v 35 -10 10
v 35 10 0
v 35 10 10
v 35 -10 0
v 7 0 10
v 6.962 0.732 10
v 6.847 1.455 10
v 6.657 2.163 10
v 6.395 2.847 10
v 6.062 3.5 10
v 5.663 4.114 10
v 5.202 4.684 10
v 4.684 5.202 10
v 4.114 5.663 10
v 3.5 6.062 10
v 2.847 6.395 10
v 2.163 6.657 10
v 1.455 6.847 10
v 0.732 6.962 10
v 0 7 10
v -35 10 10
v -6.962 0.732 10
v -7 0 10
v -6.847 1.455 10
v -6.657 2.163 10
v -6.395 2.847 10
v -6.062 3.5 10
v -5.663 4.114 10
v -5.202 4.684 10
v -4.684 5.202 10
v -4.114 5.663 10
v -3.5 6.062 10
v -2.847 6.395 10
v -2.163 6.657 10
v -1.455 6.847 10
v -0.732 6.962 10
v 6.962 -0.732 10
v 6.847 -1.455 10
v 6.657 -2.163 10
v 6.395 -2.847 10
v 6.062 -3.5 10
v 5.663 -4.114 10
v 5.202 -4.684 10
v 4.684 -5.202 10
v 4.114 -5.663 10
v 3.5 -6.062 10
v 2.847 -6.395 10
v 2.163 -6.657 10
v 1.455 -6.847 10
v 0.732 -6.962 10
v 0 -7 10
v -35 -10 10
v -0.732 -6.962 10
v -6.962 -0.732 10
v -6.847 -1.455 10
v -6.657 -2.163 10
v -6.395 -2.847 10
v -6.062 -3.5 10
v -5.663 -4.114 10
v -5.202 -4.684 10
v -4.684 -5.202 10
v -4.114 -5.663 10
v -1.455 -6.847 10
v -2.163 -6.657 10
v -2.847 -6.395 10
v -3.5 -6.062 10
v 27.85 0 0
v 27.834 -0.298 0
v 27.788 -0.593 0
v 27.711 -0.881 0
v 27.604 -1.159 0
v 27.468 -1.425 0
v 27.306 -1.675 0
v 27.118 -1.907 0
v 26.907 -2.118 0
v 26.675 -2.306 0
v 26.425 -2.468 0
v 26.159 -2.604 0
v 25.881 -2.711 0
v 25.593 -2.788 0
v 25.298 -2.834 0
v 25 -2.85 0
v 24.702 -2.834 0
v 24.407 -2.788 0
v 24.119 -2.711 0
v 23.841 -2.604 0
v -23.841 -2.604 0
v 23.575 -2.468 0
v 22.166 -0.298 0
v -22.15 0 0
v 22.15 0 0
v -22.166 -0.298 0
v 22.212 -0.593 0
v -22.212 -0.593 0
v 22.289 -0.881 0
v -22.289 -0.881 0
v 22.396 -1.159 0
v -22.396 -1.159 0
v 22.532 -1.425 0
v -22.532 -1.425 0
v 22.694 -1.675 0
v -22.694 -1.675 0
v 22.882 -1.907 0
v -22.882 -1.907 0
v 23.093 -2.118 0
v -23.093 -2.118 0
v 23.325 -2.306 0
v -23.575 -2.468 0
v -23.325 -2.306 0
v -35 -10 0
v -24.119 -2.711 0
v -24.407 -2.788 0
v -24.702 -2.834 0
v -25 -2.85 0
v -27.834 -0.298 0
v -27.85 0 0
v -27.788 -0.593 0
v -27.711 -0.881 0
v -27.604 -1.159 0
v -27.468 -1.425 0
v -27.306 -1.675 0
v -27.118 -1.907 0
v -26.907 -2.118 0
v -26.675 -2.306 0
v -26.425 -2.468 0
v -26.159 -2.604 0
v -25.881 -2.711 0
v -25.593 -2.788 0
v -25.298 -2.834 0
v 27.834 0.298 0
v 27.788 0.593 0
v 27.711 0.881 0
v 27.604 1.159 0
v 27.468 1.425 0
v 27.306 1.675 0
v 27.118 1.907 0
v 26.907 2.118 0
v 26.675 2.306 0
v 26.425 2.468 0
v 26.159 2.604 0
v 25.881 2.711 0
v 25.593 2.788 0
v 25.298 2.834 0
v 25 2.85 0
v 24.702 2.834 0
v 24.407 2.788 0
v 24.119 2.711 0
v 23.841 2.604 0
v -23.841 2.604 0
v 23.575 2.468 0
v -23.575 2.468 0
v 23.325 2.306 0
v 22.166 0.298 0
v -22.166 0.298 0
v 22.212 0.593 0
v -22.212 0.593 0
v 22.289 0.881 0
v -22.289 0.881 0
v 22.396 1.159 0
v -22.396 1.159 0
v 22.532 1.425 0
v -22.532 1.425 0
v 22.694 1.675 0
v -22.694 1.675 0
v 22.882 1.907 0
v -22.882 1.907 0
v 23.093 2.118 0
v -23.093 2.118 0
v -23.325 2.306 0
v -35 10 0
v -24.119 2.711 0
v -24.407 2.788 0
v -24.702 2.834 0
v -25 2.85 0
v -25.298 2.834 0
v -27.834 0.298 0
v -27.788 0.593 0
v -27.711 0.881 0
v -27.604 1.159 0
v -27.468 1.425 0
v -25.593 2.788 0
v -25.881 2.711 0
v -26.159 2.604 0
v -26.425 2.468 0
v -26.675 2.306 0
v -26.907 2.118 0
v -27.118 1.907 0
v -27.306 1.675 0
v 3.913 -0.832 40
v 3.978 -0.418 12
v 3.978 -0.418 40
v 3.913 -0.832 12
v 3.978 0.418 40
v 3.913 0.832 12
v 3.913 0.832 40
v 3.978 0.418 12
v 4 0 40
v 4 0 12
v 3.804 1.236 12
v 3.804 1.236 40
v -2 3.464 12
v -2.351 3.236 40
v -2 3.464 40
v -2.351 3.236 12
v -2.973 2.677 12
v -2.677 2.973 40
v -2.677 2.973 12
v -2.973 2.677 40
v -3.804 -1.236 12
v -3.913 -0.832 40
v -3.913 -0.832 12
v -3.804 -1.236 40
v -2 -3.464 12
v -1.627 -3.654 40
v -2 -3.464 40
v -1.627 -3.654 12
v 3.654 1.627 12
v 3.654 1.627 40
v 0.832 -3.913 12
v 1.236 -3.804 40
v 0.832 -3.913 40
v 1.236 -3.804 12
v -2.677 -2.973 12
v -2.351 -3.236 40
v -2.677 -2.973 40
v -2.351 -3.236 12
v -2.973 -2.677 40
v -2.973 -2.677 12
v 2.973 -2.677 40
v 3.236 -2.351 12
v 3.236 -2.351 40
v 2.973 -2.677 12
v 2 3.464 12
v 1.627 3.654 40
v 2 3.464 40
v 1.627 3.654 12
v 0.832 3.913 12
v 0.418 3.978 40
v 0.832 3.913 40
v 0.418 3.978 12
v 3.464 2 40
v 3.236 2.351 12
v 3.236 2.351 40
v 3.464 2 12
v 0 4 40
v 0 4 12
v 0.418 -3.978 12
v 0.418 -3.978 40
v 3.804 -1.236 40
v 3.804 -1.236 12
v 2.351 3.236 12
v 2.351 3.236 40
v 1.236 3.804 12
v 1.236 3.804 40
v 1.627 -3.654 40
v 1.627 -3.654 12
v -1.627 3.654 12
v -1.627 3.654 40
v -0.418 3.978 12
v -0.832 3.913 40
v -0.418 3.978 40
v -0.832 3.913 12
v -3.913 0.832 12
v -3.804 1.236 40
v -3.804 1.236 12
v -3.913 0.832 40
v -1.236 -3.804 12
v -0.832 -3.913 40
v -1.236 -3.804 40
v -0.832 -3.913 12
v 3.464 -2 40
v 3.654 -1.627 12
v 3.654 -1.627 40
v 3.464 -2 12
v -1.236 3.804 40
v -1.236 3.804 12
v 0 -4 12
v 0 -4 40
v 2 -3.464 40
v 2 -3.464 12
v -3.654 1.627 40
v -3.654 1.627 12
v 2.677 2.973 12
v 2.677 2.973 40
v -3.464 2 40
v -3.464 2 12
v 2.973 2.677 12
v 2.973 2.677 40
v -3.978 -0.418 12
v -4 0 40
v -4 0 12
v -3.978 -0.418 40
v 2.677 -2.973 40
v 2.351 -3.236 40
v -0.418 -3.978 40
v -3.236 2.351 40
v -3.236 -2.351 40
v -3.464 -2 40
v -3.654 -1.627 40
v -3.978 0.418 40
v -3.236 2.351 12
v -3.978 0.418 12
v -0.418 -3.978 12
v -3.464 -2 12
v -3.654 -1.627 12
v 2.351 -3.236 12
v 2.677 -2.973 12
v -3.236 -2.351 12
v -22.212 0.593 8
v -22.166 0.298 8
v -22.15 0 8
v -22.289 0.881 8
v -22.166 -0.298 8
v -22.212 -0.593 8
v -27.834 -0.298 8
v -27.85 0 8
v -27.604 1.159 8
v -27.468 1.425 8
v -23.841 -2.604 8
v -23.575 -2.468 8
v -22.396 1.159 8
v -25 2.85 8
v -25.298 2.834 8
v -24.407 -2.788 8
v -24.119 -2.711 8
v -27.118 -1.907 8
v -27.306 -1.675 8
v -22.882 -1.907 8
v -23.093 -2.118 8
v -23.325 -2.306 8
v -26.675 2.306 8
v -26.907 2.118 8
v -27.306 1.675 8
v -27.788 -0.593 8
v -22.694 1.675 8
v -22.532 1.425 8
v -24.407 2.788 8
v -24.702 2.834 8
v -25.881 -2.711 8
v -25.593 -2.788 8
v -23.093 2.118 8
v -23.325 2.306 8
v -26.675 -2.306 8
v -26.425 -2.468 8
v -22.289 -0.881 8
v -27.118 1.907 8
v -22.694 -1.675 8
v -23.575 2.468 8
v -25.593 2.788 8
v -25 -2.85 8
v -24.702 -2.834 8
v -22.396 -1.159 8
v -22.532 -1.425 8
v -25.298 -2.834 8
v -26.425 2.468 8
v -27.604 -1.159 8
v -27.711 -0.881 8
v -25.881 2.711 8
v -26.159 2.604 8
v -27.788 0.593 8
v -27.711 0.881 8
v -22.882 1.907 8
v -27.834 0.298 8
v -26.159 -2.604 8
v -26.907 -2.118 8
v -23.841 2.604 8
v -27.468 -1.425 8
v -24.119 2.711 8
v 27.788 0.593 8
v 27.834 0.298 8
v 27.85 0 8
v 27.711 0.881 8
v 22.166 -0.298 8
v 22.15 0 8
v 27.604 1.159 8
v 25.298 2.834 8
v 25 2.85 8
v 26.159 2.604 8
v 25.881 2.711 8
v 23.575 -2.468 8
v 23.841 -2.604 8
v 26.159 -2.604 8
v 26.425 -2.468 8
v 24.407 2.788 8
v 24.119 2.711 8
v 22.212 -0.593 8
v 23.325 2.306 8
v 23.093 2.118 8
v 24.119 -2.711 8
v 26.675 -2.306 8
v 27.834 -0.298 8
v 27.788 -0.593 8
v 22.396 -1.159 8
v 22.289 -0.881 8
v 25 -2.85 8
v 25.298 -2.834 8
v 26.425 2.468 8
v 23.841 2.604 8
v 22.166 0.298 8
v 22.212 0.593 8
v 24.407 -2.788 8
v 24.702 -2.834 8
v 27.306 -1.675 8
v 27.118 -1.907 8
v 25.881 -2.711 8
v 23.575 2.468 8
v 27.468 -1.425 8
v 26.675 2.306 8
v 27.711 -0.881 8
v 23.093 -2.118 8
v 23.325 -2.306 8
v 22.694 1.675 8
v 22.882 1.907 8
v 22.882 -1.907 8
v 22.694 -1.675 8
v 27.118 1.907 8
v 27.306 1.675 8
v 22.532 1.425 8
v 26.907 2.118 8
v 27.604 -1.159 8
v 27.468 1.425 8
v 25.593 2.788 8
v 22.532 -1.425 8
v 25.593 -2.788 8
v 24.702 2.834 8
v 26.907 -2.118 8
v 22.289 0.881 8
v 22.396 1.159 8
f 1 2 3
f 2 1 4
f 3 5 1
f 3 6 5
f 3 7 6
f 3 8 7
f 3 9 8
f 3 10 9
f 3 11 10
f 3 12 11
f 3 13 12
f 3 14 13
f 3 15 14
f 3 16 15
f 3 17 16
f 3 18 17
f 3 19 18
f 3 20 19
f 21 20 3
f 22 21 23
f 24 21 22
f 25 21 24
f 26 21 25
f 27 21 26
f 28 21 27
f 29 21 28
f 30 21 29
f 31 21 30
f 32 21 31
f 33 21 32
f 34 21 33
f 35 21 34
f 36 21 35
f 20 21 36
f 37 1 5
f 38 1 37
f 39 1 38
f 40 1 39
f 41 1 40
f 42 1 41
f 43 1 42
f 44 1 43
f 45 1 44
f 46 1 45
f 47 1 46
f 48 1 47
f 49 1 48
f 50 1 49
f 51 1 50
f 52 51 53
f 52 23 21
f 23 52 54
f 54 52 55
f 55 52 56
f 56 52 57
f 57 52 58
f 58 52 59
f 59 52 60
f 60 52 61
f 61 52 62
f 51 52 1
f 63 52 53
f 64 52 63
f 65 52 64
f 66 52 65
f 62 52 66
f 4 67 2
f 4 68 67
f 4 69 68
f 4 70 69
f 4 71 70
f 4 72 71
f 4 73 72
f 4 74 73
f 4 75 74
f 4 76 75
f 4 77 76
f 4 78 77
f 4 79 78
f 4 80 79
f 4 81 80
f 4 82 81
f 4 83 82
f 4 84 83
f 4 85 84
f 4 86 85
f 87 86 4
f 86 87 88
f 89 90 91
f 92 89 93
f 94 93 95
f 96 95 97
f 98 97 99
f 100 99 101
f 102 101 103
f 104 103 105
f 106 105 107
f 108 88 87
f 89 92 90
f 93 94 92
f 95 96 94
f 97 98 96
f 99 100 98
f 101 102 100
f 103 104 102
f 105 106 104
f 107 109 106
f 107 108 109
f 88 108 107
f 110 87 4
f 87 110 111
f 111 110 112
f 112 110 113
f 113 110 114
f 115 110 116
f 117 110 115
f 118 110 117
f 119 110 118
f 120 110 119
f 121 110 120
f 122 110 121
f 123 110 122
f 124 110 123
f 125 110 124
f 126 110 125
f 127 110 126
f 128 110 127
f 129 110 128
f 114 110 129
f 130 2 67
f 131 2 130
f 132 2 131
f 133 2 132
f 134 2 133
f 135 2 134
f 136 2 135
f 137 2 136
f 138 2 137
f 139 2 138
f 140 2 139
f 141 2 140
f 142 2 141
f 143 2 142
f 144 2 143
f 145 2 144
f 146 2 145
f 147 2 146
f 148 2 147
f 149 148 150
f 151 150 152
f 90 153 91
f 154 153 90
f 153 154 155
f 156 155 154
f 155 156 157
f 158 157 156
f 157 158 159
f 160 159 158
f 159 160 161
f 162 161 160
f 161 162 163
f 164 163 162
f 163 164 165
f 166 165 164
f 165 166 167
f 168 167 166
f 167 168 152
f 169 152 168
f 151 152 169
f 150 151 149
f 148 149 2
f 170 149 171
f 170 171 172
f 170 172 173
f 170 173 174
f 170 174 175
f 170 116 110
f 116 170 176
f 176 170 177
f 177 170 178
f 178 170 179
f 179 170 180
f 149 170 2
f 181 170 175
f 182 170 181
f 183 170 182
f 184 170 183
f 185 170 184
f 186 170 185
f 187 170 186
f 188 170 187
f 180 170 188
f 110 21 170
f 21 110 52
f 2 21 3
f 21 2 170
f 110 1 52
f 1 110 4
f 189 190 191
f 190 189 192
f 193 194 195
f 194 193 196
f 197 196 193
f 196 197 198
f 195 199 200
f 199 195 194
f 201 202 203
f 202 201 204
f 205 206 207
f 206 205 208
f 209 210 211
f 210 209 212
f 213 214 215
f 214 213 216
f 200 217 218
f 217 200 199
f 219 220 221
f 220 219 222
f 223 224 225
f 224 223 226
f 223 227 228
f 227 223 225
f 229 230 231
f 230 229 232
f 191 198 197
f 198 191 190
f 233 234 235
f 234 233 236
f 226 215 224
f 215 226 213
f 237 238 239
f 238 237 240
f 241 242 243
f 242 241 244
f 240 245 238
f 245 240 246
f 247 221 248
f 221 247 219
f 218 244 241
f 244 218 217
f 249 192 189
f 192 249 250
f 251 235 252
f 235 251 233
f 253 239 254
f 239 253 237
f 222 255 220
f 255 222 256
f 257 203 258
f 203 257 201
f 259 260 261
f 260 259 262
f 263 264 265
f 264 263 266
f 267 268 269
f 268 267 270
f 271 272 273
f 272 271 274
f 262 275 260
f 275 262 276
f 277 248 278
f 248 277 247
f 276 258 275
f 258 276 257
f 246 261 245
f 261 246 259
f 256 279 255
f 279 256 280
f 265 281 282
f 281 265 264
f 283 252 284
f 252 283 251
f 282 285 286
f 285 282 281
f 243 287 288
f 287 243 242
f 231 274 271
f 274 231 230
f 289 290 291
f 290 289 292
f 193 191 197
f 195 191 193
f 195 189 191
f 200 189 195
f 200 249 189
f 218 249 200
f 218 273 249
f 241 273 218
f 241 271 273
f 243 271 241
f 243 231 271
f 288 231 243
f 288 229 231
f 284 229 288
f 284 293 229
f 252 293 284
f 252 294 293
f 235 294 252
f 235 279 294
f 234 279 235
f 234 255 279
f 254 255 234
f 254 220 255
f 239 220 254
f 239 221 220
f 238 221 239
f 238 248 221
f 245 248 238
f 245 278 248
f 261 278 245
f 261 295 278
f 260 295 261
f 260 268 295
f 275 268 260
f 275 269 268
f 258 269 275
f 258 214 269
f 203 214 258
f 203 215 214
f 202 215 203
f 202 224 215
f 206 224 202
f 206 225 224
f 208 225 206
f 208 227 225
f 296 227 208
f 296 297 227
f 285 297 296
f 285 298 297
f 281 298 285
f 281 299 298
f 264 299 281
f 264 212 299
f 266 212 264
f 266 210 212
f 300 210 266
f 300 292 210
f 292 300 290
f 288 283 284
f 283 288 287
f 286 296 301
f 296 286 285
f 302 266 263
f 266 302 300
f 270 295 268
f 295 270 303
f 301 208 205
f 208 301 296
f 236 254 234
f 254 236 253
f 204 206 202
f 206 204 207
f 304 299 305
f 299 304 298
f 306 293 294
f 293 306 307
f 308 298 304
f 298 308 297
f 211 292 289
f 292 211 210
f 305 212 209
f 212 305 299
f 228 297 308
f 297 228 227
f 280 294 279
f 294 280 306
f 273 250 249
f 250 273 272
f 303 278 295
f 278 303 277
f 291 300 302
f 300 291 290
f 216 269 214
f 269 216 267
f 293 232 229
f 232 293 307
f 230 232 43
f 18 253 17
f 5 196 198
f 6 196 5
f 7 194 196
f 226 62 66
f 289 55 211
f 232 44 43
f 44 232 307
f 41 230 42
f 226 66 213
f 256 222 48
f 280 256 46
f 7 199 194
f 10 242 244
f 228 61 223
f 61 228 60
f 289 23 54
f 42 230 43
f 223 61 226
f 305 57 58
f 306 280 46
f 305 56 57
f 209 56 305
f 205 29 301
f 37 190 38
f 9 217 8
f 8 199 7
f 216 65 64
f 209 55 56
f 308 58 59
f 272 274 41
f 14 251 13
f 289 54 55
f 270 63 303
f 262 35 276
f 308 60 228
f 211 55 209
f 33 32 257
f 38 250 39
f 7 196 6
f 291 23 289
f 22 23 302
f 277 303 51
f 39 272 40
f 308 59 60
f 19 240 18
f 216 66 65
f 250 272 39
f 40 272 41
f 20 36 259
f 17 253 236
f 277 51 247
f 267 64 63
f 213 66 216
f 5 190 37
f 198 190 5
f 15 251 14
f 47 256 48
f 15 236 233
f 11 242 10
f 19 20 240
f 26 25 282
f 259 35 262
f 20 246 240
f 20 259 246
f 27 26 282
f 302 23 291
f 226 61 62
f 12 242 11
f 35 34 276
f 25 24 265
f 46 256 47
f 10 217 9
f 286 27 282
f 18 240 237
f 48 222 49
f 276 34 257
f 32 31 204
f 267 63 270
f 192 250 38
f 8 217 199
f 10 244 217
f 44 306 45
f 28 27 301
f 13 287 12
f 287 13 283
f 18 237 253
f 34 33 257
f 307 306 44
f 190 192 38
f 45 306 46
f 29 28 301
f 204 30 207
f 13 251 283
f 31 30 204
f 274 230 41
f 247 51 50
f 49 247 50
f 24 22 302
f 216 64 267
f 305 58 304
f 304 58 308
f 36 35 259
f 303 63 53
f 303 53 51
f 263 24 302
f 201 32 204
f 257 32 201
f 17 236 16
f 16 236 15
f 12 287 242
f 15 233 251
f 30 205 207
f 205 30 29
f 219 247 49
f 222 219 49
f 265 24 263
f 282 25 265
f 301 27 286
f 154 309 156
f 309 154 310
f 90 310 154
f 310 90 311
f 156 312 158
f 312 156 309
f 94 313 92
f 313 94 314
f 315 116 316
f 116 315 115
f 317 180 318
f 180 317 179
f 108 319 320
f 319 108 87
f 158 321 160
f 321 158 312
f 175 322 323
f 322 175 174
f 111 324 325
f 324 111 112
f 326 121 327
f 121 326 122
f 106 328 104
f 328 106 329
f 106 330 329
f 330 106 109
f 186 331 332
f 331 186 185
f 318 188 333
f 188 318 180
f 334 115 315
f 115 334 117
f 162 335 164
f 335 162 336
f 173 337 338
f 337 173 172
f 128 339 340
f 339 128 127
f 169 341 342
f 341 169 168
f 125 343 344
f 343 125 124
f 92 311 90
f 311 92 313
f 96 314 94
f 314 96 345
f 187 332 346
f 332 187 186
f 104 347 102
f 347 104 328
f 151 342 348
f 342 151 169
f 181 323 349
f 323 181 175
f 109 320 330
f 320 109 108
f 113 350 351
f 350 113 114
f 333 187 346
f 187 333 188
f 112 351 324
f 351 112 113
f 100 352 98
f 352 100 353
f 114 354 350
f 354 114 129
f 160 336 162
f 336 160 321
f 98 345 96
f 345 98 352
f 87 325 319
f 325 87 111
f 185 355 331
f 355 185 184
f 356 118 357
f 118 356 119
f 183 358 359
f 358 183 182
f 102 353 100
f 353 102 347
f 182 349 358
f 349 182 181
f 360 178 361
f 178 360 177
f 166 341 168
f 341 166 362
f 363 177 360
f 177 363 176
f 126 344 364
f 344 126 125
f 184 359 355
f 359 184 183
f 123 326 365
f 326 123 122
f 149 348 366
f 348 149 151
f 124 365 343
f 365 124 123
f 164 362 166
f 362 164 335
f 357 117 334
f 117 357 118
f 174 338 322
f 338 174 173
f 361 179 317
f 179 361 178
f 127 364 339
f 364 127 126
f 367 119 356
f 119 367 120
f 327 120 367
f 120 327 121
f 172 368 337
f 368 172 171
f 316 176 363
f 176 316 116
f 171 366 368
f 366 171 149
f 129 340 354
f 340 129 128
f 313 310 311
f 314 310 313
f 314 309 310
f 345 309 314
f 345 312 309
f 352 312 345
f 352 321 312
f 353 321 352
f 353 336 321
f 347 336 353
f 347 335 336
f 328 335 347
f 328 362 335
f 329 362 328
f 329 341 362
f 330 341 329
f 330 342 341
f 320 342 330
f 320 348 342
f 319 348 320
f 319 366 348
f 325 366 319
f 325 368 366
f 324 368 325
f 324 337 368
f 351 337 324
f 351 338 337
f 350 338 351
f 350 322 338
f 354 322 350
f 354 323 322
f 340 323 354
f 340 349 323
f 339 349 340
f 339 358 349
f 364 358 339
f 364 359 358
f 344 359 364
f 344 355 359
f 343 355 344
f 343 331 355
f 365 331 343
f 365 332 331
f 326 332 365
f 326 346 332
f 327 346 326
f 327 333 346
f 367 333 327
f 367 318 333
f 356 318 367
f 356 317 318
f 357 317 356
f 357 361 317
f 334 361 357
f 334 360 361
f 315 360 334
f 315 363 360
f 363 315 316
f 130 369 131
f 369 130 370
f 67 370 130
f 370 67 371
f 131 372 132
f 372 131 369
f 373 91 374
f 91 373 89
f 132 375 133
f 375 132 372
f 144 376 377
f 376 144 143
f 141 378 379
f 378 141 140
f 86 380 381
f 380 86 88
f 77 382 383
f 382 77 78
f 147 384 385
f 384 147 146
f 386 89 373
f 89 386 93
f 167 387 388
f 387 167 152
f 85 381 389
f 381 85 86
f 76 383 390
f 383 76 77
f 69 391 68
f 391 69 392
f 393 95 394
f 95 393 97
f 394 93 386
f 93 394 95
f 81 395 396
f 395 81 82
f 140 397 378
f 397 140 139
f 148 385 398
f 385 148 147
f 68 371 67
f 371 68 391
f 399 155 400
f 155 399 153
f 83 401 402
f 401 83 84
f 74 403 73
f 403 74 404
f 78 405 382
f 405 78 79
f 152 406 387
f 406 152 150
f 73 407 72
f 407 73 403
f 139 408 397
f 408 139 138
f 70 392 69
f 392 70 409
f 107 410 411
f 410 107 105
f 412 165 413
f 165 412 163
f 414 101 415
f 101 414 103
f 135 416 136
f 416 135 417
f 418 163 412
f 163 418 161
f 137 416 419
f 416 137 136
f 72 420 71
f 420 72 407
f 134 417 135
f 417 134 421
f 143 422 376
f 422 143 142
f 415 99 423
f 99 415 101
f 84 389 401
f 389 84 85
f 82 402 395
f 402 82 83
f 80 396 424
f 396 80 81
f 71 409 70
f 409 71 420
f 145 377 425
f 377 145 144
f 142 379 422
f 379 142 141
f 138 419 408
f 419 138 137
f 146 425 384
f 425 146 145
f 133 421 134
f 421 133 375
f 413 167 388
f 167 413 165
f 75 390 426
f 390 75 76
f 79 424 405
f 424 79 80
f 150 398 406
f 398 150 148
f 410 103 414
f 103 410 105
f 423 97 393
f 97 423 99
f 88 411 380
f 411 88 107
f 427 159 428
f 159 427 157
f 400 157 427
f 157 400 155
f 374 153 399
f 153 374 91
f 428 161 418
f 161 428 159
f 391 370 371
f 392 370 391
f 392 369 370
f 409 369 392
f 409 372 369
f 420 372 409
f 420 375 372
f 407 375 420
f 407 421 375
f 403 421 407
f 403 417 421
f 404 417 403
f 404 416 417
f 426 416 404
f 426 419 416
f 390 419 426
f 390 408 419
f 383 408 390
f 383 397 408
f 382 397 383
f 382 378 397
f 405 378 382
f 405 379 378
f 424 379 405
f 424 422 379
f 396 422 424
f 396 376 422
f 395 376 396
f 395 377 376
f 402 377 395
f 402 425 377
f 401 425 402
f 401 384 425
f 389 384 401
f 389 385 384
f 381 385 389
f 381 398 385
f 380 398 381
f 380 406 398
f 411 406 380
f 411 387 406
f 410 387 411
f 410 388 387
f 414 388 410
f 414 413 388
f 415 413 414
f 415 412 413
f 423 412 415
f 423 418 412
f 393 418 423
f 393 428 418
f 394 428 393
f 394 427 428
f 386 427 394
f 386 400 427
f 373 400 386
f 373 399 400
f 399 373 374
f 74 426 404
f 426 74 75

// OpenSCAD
// Modular Wind-Up Mini Golf System
// PART 2: Obstacles & Accessories

/* [Core Tolerances] */
tile_thickness = 8;
peg_diameter = 5.5; 

$fn = 60; 

// ==========================================
// RENDER SELECTION
// Uncomment the piece you want to export
// ==========================================

// --- OBSTACLES (Moving Hazards) ---
turnstile_base();
// turnstile_rotor();        // TIP: Print this upside-down in your slicer!

// --- OBSTACLES (Directional Plug-in Holes) ---
// plug_hole_1_ramp();       
// plug_hole_2_ramp_thru();  
// plug_hole_2_ramp_turn();  
// plug_hole_3_ramp();       
// plug_hole_4_ramp();       

// --- ACCESSORIES ---
// connector_peg();          

// ==========================================
// TURNSTILE MODULES
// ==========================================

module turnstile_base() {
    base_length = 70;
    base_width = 20;
    base_height = 10;
    axle_diameter = 8;
    axle_height = 30; 
    c_hole = 0.2; 
    
    difference() {
        union() {
            translate([0, 0, base_height/2]) 
                cube([base_length, base_width, base_height], center=true);
            translate([0, 0, base_height]) 
                cylinder(h=axle_height, d=axle_diameter);
            translate([0, 0, base_height])
                cylinder(h=2, d1=axle_diameter + 6, d2=axle_diameter);
        }
        
        for (x = [-25, 25]) {
            translate([x, 0, -0.1])
                cylinder(h=8.1, d=peg_diameter + c_hole);
        }
    }
}

module turnstile_rotor() {
    clearance = 0.6; 
    hub_d = 16;
    hub_h = 32; 
    arm_length = 80; 
    arm_thickness = 6;
    arm_height = 12; 

    difference() {
        union() {
            cylinder(h=hub_h, d=hub_d);
            translate([0, 0, hub_h - arm_height]) {
                for (r = [0, 90, 180, 270]) {
                    rotate([0, 0, r])
                        translate([hub_d/2 - 0.5, -arm_thickness/2, 0])
                            cube([arm_length - hub_d/2 + 0.5, arm_thickness, arm_height]);
                }
            }
        }
        translate([0, 0, -1]) 
            cylinder(h=hub_h + 2, d=8 + clearance);
    }
}

// ==========================================
// TARGET HOLE MODULES
// ==========================================

module plug_hole_1_ramp()      { build_directional_hole([1, 0, 0, 0]); }
module plug_hole_2_ramp_thru() { build_directional_hole([1, 0, 1, 0]); }
module plug_hole_2_ramp_turn() { build_directional_hole([1, 1, 0, 0]); }
module plug_hole_3_ramp()      { build_directional_hole([1, 1, 0, 1]); }
module plug_hole_4_ramp()      { build_directional_hole([1, 1, 1, 1]); }

module build_directional_hole(ramps) {
    height = 10;
    hole_diameter = 85; 
    c_hole = 0.2; 
    
    core_size = 115; 
    t_front = -core_size/2;
    t_right =  core_size/2;
    t_back  =  core_size/2;
    t_left  = -core_size/2;
    
    ramp_run = 35;
    b_front = ramps[0] ? t_front - ramp_run : t_front;
    b_right = ramps[1] ? t_right + ramp_run : t_right;
    b_back  = ramps[2] ? t_back  + ramp_run : t_back;
    b_left  = ramps[3] ? t_left  - ramp_run : t_left;
    
    difference() {
        hull() {
            translate([0, 0, 0.1])
                linear_extrude(0.2, center=true)
                polygon([
                    [b_left, b_front],
                    [b_right, b_front],
                    [b_right, b_back],
                    [b_left, b_back]
                ]);
            translate([0, 0, height - 0.1])
                linear_extrude(0.2, center=true)
                polygon([
                    [t_left, t_front],
                    [t_right, t_front],
                    [t_right, t_back],
                    [t_left, t_back]
                ]);
        }
        
        translate([0, 0, -1])
            cylinder(h=height + 2, d=hole_diameter);

        peg_spread = 50;
        steps = [-peg_spread, 0, peg_spread];
        for(x = steps) {
            for(y = steps) {
                if (x != 0 || y != 0) {
                    translate([x, y, -0.1])
                        cylinder(h=8.1, d=peg_diameter + c_hole);
                }
            }
        }
    }
}

// ==========================================
// ACCESSORY MODULES
// ==========================================

module connector_peg() {
    c = 0.15;
    d = peg_diameter - c;
    h = 15;
    chamf = 1; 
    
    union() {
        translate([0, 0, chamf]) 
            cylinder(h = h - 2*chamf, d = d);
        cylinder(h = chamf, d1 = d - 2*chamf, d2 = d);
        translate([0, 0, h - chamf]) 
            cylinder(h = chamf, d1 = d, d2 = d - 2*chamf);
    }
}
